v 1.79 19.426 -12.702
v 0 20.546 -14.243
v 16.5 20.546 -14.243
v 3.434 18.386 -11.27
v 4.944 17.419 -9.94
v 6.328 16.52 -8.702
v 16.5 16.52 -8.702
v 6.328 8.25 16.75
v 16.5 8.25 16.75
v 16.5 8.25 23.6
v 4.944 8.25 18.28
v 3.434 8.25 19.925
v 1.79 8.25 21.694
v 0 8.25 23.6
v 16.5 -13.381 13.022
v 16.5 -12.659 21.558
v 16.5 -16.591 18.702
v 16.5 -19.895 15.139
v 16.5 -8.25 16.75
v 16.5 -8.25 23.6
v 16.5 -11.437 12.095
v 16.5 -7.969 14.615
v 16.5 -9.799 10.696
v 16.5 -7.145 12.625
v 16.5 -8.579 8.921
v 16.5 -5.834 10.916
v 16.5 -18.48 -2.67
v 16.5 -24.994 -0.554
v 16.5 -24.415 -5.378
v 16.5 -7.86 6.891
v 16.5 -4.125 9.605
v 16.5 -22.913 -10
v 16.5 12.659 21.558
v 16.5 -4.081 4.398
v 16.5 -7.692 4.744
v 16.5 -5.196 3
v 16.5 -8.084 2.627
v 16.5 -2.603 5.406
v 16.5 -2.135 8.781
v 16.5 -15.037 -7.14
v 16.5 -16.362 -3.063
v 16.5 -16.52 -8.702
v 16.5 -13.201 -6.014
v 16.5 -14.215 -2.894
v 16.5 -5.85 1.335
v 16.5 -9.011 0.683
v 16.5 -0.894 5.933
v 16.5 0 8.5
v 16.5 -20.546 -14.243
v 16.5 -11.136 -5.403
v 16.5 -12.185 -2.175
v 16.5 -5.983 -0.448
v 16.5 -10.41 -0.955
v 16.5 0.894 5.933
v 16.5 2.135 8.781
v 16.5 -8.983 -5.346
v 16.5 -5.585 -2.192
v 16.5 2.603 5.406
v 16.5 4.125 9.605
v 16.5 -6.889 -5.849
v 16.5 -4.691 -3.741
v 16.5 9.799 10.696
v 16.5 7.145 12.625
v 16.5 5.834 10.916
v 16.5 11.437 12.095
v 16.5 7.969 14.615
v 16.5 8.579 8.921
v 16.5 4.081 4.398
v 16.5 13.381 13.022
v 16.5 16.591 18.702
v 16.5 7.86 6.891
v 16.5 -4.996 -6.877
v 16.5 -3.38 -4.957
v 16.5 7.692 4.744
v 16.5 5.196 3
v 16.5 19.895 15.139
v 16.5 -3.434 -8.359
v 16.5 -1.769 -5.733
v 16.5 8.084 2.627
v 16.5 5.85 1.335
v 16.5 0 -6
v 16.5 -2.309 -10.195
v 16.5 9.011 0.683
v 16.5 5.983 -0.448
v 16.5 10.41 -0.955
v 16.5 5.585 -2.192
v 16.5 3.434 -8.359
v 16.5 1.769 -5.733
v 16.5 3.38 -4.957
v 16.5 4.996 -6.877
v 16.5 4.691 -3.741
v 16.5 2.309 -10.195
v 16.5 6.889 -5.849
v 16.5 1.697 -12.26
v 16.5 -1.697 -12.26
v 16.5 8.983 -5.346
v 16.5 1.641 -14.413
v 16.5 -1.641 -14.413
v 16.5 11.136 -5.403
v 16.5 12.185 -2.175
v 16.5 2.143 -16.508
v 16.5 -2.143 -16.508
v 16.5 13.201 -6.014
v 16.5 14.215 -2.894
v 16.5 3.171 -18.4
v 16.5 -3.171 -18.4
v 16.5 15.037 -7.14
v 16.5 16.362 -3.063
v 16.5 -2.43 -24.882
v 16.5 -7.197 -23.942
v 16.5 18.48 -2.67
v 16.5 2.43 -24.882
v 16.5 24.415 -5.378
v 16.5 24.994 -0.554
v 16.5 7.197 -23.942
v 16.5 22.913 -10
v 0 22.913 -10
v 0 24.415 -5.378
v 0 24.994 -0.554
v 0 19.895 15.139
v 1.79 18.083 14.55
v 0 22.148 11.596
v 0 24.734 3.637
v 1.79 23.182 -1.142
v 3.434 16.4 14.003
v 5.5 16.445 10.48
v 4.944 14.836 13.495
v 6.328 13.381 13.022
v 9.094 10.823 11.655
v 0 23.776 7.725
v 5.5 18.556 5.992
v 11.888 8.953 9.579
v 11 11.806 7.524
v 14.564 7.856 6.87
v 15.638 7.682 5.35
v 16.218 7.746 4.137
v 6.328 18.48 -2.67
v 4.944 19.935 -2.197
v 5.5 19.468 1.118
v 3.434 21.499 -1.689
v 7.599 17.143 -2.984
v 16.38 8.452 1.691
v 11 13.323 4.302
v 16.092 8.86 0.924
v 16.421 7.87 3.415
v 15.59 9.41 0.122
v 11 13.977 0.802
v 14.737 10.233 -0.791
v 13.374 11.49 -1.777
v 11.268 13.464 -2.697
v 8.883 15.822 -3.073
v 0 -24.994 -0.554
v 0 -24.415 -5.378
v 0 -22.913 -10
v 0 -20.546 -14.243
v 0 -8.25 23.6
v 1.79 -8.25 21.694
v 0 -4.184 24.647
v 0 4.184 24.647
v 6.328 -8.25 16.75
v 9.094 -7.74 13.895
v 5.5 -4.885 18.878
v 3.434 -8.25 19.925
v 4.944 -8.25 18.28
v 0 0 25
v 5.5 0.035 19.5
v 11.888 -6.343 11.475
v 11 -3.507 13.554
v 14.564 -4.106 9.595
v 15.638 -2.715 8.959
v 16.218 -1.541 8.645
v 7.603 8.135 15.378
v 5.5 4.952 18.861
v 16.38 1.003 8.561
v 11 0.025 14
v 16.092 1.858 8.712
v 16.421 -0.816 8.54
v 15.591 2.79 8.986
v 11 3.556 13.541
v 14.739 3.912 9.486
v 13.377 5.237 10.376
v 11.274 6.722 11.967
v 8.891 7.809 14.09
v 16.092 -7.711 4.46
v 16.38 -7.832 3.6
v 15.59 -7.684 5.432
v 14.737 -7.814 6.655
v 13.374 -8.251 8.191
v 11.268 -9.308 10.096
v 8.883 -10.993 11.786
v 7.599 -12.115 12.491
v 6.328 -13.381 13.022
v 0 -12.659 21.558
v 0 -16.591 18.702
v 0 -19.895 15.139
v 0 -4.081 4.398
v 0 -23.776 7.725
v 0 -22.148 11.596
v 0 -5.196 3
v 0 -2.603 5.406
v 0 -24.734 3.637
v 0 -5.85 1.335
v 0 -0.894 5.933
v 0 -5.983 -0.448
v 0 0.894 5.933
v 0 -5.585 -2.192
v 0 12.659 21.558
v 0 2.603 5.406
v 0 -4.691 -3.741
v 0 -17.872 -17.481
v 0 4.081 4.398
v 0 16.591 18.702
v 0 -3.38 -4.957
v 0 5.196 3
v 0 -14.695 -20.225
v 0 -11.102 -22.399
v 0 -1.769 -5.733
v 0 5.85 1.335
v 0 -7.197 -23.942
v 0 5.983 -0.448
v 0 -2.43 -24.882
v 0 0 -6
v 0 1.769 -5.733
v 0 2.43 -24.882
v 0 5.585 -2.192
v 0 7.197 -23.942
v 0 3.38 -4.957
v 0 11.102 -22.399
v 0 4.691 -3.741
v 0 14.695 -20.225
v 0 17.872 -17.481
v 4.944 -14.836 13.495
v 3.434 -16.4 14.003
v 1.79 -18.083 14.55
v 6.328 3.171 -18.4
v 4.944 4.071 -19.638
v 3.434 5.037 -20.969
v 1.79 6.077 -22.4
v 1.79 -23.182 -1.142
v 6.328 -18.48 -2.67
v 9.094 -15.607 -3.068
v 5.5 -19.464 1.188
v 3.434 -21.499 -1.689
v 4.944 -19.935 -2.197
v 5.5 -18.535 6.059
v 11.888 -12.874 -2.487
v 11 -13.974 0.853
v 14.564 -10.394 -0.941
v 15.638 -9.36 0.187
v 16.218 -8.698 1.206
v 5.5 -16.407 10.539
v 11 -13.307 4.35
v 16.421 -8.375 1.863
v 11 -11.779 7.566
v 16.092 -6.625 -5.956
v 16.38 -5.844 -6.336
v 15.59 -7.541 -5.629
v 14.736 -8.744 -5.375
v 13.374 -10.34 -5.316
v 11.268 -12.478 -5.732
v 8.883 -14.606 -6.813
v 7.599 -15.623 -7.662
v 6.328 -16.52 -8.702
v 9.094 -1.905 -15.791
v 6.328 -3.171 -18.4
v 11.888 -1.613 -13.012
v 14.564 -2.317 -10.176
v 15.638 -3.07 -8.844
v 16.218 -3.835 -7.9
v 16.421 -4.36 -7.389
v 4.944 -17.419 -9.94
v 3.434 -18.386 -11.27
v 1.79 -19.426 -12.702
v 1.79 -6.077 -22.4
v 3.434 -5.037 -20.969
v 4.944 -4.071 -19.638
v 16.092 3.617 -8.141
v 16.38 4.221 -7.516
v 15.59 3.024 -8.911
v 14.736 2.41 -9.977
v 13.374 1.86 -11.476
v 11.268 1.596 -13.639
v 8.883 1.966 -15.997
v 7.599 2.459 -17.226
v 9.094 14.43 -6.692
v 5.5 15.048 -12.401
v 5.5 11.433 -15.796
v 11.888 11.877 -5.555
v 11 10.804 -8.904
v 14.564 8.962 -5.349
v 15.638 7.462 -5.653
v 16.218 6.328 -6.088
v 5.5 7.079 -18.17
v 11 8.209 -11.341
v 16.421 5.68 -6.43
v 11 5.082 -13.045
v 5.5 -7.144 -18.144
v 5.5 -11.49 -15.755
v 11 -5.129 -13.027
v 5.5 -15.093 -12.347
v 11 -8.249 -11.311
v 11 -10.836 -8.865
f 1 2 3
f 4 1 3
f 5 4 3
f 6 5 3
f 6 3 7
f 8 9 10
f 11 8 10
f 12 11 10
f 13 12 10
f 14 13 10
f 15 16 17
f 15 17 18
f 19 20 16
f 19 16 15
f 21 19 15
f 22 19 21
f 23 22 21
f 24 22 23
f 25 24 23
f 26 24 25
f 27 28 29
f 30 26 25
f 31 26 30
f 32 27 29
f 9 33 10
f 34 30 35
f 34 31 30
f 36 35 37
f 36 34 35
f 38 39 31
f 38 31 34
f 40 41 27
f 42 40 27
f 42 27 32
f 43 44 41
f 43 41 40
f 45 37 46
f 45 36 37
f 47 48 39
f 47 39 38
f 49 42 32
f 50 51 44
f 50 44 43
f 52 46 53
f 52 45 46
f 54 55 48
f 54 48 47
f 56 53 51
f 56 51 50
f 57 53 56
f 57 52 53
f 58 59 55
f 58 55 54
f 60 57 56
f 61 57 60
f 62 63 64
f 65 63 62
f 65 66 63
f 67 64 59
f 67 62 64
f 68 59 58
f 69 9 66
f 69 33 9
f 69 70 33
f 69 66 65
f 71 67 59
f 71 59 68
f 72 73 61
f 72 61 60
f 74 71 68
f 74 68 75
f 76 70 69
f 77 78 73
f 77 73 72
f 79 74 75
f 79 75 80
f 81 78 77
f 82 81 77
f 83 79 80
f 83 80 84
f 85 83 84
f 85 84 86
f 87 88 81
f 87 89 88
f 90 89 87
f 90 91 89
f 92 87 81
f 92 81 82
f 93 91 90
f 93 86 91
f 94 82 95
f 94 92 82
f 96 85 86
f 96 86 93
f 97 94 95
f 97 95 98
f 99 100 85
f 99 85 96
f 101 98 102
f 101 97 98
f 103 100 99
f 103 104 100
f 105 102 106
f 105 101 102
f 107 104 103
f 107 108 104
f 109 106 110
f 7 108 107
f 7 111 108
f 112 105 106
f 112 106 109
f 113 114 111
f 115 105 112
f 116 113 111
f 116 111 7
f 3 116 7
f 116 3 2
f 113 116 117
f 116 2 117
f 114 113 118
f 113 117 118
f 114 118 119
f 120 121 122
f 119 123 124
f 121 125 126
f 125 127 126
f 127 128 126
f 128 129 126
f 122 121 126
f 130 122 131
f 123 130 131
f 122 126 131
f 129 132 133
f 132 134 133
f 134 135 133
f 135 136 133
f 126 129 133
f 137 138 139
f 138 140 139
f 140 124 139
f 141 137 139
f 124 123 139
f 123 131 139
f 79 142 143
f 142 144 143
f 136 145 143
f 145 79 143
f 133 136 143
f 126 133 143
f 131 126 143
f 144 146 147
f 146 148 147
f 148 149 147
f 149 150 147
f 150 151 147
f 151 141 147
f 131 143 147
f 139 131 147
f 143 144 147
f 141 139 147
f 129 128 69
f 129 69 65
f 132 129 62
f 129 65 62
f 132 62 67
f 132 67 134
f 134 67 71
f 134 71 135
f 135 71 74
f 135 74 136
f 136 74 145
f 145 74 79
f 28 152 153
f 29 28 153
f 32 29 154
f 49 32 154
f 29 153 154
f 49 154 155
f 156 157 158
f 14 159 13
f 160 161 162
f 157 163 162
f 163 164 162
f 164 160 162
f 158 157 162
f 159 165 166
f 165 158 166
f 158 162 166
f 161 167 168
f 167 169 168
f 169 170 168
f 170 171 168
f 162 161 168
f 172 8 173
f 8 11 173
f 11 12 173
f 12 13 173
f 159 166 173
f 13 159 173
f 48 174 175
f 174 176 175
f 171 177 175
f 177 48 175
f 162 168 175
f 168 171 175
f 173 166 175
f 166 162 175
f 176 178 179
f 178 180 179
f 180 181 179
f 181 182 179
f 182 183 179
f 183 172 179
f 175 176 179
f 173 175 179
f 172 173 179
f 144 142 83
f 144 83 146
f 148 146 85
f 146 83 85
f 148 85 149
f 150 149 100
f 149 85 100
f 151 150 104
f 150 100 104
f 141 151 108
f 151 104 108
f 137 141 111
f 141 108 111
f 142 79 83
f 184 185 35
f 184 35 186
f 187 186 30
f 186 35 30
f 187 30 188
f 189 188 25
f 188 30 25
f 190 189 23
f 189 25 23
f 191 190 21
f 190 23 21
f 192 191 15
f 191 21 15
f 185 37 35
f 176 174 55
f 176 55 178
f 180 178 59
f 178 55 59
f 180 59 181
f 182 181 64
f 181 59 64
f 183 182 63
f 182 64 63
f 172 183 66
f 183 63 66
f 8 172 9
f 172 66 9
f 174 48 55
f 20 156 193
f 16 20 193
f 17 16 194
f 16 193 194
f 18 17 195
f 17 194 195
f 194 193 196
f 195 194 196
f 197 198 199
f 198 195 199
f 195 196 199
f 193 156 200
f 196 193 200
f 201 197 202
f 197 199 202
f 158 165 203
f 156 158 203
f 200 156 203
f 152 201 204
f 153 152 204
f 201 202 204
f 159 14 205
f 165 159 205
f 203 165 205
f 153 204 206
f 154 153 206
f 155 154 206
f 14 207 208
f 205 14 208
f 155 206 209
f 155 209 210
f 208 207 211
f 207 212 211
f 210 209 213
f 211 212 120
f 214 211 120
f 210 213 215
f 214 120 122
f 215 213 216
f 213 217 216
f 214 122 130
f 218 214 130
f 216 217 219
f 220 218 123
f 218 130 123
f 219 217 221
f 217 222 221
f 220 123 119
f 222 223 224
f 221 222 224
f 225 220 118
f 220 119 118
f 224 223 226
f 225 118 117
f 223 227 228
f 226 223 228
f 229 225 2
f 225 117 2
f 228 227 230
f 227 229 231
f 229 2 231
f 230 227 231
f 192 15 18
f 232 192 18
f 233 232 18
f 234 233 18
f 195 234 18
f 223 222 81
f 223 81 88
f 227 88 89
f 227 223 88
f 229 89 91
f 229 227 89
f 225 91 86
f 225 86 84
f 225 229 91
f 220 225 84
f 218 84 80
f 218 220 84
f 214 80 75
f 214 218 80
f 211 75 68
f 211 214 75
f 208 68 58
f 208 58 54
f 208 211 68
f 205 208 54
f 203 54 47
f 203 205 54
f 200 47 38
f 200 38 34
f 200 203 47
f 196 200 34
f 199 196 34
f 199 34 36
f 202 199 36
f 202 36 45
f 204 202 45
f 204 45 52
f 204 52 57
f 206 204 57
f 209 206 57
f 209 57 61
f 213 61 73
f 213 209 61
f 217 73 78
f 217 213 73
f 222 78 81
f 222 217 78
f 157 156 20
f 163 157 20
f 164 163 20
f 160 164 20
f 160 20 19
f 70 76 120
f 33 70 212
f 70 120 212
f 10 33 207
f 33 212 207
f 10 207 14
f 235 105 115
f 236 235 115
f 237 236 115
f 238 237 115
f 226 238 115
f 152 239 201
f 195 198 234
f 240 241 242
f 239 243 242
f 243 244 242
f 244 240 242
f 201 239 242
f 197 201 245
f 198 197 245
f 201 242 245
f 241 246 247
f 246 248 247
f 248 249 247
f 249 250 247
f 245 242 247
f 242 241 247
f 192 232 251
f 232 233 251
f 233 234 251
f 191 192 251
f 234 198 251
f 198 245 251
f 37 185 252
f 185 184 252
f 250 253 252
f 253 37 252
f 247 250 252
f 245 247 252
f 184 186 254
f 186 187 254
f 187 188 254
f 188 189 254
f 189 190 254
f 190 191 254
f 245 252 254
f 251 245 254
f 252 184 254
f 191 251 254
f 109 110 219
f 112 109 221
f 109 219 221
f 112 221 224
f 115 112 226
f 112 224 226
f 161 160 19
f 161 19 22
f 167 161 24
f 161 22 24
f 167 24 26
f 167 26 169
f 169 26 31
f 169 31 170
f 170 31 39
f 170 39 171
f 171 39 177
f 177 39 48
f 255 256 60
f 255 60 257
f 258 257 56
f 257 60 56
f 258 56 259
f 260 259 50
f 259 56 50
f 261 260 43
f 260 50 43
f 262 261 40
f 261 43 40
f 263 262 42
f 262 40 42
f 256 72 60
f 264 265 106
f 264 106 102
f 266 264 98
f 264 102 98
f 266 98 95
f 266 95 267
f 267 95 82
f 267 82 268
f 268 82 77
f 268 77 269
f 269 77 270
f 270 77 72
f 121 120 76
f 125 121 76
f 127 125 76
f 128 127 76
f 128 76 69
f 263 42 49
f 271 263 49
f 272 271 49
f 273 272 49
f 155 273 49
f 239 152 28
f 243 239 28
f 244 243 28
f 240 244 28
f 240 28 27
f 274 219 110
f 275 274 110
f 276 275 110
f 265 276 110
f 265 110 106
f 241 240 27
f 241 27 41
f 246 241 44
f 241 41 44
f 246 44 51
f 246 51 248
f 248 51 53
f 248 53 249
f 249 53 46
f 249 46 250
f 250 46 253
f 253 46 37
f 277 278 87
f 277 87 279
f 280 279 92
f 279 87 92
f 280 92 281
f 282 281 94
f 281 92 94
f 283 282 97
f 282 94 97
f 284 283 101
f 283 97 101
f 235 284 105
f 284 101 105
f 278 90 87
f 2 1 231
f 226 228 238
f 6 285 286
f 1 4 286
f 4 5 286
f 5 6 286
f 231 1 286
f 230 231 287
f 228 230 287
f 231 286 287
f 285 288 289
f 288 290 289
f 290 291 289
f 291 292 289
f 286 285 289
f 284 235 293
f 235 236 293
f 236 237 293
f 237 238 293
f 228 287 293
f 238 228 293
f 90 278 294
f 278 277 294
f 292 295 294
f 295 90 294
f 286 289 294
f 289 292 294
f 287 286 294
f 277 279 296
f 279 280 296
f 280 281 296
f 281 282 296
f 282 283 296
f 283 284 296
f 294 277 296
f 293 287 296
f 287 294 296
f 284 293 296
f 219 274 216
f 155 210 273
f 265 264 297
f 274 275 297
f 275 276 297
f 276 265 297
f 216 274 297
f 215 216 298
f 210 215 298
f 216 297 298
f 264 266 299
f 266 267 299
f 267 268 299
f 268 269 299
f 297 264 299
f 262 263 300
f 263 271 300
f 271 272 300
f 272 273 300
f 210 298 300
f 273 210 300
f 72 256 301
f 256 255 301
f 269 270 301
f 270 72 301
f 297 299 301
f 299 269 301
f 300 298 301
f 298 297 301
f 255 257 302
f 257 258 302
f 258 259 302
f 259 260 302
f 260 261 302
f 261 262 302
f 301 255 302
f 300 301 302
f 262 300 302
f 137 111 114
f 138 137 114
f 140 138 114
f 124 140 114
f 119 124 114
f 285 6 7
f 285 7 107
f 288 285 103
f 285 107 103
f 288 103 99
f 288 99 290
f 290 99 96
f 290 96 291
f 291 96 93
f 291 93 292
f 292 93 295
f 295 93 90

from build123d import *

# Parameters (mm, degrees)
SKETCH1_R           = 25
SKETCH1_R_2         = 6
BOSS_EXTRUDE1_DEPTH = 16.5
CUT_EXTRUDE3_DEPTH  = 30


with BuildPart() as part:
    # Sketch1 → Boss-Extrude1 (new body)
    with BuildSketch(Plane(origin=(0, 0, 0), x_dir=(0, 0, -1), z_dir=(1, 0, 0))):
        Circle(SKETCH1_R)
        Circle(SKETCH1_R_2, mode=Mode.SUBTRACT)
    extrude(amount=BOSS_EXTRUDE1_DEPTH)

    # Sketch4 → Cut-Extrude3 (cut)
    with BuildSketch(Plane(origin=(16.5, 0, 0), x_dir=(0, 0, -1), z_dir=(1, 0, 0))):
        with BuildLine():
            Line((-16.75, 8.25), (-27.17881333, 8.25))
            Line((-27.17881333, 8.25), (-27.17881333, -8.25))
            Line((-27.17881333, -8.25), (-16.75, -8.25))
            ThreePointArc((-16.75, -8.25), (-8.5, 0), (-16.75, 8.25))
        make_face()
        with BuildLine():
            Line((2.670181604, 18.479586852), (-0.552498946, 28.397977726))
            Line((-0.552498946, 28.397977726), (-16.244931465, 23.299197319))
            Line((-16.244931465, 23.299197319), (-13.022250915, 13.380806444))
            ThreePointArc((-13.022250915, 13.380806444), (-2.626644452, 8.083980389), (2.670181604, 18.479586852))
        make_face()
        with BuildLine():
            Line((18.400262987, 3.171012772), (26.837350202, 9.300915446))
            Line((26.837350202, 9.300915446), (17.138893539, 22.649695854))
            Line((17.138893539, 22.649695854), (8.701806324, 16.519793179))
            ThreePointArc((8.701806324, 16.519793179), (6.876644452, 4.996174644), (18.400262987, 3.171012772))
        make_face()
        with BuildLine():
            Line((8.701806324, -16.519793179), (17.138893539, -22.649695854))
            Line((17.138893539, -22.649695854), (26.837350202, -9.300915446))
            Line((26.837350202, -9.300915446), (18.400262987, -3.171012772))
            ThreePointArc((18.400262987, -3.171012772), (6.876644452, -4.996174644), (8.701806324, -16.519793179))
        make_face()
        with BuildLine():
            Line((-13.022250915, -13.380806444), (-16.244931465, -23.299197319))
            Line((-16.244931465, -23.299197319), (-0.552498946, -28.397977726))
            Line((-0.552498946, -28.397977726), (2.670181604, -18.479586852))
            ThreePointArc((2.670181604, -18.479586852), (-2.626644452, -8.083980389), (-13.022250915, -13.380806444))
        make_face()
    extrude(amount=-CUT_EXTRUDE3_DEPTH, mode=Mode.SUBTRACT)

    # Sketch6 → Revolve1 (revolve)
    with BuildSketch(Plane(origin=(0, 0, 0), x_dir=(1, 0, 0), z_dir=(0, 1, 0))):
        Polygon((0, -25), (16.5, -8.5), (0, -8.5), align=None)
    revolve(axis=Axis((27.230838135, 0, 0), (-1, 0, 0)))


solid = part.part
